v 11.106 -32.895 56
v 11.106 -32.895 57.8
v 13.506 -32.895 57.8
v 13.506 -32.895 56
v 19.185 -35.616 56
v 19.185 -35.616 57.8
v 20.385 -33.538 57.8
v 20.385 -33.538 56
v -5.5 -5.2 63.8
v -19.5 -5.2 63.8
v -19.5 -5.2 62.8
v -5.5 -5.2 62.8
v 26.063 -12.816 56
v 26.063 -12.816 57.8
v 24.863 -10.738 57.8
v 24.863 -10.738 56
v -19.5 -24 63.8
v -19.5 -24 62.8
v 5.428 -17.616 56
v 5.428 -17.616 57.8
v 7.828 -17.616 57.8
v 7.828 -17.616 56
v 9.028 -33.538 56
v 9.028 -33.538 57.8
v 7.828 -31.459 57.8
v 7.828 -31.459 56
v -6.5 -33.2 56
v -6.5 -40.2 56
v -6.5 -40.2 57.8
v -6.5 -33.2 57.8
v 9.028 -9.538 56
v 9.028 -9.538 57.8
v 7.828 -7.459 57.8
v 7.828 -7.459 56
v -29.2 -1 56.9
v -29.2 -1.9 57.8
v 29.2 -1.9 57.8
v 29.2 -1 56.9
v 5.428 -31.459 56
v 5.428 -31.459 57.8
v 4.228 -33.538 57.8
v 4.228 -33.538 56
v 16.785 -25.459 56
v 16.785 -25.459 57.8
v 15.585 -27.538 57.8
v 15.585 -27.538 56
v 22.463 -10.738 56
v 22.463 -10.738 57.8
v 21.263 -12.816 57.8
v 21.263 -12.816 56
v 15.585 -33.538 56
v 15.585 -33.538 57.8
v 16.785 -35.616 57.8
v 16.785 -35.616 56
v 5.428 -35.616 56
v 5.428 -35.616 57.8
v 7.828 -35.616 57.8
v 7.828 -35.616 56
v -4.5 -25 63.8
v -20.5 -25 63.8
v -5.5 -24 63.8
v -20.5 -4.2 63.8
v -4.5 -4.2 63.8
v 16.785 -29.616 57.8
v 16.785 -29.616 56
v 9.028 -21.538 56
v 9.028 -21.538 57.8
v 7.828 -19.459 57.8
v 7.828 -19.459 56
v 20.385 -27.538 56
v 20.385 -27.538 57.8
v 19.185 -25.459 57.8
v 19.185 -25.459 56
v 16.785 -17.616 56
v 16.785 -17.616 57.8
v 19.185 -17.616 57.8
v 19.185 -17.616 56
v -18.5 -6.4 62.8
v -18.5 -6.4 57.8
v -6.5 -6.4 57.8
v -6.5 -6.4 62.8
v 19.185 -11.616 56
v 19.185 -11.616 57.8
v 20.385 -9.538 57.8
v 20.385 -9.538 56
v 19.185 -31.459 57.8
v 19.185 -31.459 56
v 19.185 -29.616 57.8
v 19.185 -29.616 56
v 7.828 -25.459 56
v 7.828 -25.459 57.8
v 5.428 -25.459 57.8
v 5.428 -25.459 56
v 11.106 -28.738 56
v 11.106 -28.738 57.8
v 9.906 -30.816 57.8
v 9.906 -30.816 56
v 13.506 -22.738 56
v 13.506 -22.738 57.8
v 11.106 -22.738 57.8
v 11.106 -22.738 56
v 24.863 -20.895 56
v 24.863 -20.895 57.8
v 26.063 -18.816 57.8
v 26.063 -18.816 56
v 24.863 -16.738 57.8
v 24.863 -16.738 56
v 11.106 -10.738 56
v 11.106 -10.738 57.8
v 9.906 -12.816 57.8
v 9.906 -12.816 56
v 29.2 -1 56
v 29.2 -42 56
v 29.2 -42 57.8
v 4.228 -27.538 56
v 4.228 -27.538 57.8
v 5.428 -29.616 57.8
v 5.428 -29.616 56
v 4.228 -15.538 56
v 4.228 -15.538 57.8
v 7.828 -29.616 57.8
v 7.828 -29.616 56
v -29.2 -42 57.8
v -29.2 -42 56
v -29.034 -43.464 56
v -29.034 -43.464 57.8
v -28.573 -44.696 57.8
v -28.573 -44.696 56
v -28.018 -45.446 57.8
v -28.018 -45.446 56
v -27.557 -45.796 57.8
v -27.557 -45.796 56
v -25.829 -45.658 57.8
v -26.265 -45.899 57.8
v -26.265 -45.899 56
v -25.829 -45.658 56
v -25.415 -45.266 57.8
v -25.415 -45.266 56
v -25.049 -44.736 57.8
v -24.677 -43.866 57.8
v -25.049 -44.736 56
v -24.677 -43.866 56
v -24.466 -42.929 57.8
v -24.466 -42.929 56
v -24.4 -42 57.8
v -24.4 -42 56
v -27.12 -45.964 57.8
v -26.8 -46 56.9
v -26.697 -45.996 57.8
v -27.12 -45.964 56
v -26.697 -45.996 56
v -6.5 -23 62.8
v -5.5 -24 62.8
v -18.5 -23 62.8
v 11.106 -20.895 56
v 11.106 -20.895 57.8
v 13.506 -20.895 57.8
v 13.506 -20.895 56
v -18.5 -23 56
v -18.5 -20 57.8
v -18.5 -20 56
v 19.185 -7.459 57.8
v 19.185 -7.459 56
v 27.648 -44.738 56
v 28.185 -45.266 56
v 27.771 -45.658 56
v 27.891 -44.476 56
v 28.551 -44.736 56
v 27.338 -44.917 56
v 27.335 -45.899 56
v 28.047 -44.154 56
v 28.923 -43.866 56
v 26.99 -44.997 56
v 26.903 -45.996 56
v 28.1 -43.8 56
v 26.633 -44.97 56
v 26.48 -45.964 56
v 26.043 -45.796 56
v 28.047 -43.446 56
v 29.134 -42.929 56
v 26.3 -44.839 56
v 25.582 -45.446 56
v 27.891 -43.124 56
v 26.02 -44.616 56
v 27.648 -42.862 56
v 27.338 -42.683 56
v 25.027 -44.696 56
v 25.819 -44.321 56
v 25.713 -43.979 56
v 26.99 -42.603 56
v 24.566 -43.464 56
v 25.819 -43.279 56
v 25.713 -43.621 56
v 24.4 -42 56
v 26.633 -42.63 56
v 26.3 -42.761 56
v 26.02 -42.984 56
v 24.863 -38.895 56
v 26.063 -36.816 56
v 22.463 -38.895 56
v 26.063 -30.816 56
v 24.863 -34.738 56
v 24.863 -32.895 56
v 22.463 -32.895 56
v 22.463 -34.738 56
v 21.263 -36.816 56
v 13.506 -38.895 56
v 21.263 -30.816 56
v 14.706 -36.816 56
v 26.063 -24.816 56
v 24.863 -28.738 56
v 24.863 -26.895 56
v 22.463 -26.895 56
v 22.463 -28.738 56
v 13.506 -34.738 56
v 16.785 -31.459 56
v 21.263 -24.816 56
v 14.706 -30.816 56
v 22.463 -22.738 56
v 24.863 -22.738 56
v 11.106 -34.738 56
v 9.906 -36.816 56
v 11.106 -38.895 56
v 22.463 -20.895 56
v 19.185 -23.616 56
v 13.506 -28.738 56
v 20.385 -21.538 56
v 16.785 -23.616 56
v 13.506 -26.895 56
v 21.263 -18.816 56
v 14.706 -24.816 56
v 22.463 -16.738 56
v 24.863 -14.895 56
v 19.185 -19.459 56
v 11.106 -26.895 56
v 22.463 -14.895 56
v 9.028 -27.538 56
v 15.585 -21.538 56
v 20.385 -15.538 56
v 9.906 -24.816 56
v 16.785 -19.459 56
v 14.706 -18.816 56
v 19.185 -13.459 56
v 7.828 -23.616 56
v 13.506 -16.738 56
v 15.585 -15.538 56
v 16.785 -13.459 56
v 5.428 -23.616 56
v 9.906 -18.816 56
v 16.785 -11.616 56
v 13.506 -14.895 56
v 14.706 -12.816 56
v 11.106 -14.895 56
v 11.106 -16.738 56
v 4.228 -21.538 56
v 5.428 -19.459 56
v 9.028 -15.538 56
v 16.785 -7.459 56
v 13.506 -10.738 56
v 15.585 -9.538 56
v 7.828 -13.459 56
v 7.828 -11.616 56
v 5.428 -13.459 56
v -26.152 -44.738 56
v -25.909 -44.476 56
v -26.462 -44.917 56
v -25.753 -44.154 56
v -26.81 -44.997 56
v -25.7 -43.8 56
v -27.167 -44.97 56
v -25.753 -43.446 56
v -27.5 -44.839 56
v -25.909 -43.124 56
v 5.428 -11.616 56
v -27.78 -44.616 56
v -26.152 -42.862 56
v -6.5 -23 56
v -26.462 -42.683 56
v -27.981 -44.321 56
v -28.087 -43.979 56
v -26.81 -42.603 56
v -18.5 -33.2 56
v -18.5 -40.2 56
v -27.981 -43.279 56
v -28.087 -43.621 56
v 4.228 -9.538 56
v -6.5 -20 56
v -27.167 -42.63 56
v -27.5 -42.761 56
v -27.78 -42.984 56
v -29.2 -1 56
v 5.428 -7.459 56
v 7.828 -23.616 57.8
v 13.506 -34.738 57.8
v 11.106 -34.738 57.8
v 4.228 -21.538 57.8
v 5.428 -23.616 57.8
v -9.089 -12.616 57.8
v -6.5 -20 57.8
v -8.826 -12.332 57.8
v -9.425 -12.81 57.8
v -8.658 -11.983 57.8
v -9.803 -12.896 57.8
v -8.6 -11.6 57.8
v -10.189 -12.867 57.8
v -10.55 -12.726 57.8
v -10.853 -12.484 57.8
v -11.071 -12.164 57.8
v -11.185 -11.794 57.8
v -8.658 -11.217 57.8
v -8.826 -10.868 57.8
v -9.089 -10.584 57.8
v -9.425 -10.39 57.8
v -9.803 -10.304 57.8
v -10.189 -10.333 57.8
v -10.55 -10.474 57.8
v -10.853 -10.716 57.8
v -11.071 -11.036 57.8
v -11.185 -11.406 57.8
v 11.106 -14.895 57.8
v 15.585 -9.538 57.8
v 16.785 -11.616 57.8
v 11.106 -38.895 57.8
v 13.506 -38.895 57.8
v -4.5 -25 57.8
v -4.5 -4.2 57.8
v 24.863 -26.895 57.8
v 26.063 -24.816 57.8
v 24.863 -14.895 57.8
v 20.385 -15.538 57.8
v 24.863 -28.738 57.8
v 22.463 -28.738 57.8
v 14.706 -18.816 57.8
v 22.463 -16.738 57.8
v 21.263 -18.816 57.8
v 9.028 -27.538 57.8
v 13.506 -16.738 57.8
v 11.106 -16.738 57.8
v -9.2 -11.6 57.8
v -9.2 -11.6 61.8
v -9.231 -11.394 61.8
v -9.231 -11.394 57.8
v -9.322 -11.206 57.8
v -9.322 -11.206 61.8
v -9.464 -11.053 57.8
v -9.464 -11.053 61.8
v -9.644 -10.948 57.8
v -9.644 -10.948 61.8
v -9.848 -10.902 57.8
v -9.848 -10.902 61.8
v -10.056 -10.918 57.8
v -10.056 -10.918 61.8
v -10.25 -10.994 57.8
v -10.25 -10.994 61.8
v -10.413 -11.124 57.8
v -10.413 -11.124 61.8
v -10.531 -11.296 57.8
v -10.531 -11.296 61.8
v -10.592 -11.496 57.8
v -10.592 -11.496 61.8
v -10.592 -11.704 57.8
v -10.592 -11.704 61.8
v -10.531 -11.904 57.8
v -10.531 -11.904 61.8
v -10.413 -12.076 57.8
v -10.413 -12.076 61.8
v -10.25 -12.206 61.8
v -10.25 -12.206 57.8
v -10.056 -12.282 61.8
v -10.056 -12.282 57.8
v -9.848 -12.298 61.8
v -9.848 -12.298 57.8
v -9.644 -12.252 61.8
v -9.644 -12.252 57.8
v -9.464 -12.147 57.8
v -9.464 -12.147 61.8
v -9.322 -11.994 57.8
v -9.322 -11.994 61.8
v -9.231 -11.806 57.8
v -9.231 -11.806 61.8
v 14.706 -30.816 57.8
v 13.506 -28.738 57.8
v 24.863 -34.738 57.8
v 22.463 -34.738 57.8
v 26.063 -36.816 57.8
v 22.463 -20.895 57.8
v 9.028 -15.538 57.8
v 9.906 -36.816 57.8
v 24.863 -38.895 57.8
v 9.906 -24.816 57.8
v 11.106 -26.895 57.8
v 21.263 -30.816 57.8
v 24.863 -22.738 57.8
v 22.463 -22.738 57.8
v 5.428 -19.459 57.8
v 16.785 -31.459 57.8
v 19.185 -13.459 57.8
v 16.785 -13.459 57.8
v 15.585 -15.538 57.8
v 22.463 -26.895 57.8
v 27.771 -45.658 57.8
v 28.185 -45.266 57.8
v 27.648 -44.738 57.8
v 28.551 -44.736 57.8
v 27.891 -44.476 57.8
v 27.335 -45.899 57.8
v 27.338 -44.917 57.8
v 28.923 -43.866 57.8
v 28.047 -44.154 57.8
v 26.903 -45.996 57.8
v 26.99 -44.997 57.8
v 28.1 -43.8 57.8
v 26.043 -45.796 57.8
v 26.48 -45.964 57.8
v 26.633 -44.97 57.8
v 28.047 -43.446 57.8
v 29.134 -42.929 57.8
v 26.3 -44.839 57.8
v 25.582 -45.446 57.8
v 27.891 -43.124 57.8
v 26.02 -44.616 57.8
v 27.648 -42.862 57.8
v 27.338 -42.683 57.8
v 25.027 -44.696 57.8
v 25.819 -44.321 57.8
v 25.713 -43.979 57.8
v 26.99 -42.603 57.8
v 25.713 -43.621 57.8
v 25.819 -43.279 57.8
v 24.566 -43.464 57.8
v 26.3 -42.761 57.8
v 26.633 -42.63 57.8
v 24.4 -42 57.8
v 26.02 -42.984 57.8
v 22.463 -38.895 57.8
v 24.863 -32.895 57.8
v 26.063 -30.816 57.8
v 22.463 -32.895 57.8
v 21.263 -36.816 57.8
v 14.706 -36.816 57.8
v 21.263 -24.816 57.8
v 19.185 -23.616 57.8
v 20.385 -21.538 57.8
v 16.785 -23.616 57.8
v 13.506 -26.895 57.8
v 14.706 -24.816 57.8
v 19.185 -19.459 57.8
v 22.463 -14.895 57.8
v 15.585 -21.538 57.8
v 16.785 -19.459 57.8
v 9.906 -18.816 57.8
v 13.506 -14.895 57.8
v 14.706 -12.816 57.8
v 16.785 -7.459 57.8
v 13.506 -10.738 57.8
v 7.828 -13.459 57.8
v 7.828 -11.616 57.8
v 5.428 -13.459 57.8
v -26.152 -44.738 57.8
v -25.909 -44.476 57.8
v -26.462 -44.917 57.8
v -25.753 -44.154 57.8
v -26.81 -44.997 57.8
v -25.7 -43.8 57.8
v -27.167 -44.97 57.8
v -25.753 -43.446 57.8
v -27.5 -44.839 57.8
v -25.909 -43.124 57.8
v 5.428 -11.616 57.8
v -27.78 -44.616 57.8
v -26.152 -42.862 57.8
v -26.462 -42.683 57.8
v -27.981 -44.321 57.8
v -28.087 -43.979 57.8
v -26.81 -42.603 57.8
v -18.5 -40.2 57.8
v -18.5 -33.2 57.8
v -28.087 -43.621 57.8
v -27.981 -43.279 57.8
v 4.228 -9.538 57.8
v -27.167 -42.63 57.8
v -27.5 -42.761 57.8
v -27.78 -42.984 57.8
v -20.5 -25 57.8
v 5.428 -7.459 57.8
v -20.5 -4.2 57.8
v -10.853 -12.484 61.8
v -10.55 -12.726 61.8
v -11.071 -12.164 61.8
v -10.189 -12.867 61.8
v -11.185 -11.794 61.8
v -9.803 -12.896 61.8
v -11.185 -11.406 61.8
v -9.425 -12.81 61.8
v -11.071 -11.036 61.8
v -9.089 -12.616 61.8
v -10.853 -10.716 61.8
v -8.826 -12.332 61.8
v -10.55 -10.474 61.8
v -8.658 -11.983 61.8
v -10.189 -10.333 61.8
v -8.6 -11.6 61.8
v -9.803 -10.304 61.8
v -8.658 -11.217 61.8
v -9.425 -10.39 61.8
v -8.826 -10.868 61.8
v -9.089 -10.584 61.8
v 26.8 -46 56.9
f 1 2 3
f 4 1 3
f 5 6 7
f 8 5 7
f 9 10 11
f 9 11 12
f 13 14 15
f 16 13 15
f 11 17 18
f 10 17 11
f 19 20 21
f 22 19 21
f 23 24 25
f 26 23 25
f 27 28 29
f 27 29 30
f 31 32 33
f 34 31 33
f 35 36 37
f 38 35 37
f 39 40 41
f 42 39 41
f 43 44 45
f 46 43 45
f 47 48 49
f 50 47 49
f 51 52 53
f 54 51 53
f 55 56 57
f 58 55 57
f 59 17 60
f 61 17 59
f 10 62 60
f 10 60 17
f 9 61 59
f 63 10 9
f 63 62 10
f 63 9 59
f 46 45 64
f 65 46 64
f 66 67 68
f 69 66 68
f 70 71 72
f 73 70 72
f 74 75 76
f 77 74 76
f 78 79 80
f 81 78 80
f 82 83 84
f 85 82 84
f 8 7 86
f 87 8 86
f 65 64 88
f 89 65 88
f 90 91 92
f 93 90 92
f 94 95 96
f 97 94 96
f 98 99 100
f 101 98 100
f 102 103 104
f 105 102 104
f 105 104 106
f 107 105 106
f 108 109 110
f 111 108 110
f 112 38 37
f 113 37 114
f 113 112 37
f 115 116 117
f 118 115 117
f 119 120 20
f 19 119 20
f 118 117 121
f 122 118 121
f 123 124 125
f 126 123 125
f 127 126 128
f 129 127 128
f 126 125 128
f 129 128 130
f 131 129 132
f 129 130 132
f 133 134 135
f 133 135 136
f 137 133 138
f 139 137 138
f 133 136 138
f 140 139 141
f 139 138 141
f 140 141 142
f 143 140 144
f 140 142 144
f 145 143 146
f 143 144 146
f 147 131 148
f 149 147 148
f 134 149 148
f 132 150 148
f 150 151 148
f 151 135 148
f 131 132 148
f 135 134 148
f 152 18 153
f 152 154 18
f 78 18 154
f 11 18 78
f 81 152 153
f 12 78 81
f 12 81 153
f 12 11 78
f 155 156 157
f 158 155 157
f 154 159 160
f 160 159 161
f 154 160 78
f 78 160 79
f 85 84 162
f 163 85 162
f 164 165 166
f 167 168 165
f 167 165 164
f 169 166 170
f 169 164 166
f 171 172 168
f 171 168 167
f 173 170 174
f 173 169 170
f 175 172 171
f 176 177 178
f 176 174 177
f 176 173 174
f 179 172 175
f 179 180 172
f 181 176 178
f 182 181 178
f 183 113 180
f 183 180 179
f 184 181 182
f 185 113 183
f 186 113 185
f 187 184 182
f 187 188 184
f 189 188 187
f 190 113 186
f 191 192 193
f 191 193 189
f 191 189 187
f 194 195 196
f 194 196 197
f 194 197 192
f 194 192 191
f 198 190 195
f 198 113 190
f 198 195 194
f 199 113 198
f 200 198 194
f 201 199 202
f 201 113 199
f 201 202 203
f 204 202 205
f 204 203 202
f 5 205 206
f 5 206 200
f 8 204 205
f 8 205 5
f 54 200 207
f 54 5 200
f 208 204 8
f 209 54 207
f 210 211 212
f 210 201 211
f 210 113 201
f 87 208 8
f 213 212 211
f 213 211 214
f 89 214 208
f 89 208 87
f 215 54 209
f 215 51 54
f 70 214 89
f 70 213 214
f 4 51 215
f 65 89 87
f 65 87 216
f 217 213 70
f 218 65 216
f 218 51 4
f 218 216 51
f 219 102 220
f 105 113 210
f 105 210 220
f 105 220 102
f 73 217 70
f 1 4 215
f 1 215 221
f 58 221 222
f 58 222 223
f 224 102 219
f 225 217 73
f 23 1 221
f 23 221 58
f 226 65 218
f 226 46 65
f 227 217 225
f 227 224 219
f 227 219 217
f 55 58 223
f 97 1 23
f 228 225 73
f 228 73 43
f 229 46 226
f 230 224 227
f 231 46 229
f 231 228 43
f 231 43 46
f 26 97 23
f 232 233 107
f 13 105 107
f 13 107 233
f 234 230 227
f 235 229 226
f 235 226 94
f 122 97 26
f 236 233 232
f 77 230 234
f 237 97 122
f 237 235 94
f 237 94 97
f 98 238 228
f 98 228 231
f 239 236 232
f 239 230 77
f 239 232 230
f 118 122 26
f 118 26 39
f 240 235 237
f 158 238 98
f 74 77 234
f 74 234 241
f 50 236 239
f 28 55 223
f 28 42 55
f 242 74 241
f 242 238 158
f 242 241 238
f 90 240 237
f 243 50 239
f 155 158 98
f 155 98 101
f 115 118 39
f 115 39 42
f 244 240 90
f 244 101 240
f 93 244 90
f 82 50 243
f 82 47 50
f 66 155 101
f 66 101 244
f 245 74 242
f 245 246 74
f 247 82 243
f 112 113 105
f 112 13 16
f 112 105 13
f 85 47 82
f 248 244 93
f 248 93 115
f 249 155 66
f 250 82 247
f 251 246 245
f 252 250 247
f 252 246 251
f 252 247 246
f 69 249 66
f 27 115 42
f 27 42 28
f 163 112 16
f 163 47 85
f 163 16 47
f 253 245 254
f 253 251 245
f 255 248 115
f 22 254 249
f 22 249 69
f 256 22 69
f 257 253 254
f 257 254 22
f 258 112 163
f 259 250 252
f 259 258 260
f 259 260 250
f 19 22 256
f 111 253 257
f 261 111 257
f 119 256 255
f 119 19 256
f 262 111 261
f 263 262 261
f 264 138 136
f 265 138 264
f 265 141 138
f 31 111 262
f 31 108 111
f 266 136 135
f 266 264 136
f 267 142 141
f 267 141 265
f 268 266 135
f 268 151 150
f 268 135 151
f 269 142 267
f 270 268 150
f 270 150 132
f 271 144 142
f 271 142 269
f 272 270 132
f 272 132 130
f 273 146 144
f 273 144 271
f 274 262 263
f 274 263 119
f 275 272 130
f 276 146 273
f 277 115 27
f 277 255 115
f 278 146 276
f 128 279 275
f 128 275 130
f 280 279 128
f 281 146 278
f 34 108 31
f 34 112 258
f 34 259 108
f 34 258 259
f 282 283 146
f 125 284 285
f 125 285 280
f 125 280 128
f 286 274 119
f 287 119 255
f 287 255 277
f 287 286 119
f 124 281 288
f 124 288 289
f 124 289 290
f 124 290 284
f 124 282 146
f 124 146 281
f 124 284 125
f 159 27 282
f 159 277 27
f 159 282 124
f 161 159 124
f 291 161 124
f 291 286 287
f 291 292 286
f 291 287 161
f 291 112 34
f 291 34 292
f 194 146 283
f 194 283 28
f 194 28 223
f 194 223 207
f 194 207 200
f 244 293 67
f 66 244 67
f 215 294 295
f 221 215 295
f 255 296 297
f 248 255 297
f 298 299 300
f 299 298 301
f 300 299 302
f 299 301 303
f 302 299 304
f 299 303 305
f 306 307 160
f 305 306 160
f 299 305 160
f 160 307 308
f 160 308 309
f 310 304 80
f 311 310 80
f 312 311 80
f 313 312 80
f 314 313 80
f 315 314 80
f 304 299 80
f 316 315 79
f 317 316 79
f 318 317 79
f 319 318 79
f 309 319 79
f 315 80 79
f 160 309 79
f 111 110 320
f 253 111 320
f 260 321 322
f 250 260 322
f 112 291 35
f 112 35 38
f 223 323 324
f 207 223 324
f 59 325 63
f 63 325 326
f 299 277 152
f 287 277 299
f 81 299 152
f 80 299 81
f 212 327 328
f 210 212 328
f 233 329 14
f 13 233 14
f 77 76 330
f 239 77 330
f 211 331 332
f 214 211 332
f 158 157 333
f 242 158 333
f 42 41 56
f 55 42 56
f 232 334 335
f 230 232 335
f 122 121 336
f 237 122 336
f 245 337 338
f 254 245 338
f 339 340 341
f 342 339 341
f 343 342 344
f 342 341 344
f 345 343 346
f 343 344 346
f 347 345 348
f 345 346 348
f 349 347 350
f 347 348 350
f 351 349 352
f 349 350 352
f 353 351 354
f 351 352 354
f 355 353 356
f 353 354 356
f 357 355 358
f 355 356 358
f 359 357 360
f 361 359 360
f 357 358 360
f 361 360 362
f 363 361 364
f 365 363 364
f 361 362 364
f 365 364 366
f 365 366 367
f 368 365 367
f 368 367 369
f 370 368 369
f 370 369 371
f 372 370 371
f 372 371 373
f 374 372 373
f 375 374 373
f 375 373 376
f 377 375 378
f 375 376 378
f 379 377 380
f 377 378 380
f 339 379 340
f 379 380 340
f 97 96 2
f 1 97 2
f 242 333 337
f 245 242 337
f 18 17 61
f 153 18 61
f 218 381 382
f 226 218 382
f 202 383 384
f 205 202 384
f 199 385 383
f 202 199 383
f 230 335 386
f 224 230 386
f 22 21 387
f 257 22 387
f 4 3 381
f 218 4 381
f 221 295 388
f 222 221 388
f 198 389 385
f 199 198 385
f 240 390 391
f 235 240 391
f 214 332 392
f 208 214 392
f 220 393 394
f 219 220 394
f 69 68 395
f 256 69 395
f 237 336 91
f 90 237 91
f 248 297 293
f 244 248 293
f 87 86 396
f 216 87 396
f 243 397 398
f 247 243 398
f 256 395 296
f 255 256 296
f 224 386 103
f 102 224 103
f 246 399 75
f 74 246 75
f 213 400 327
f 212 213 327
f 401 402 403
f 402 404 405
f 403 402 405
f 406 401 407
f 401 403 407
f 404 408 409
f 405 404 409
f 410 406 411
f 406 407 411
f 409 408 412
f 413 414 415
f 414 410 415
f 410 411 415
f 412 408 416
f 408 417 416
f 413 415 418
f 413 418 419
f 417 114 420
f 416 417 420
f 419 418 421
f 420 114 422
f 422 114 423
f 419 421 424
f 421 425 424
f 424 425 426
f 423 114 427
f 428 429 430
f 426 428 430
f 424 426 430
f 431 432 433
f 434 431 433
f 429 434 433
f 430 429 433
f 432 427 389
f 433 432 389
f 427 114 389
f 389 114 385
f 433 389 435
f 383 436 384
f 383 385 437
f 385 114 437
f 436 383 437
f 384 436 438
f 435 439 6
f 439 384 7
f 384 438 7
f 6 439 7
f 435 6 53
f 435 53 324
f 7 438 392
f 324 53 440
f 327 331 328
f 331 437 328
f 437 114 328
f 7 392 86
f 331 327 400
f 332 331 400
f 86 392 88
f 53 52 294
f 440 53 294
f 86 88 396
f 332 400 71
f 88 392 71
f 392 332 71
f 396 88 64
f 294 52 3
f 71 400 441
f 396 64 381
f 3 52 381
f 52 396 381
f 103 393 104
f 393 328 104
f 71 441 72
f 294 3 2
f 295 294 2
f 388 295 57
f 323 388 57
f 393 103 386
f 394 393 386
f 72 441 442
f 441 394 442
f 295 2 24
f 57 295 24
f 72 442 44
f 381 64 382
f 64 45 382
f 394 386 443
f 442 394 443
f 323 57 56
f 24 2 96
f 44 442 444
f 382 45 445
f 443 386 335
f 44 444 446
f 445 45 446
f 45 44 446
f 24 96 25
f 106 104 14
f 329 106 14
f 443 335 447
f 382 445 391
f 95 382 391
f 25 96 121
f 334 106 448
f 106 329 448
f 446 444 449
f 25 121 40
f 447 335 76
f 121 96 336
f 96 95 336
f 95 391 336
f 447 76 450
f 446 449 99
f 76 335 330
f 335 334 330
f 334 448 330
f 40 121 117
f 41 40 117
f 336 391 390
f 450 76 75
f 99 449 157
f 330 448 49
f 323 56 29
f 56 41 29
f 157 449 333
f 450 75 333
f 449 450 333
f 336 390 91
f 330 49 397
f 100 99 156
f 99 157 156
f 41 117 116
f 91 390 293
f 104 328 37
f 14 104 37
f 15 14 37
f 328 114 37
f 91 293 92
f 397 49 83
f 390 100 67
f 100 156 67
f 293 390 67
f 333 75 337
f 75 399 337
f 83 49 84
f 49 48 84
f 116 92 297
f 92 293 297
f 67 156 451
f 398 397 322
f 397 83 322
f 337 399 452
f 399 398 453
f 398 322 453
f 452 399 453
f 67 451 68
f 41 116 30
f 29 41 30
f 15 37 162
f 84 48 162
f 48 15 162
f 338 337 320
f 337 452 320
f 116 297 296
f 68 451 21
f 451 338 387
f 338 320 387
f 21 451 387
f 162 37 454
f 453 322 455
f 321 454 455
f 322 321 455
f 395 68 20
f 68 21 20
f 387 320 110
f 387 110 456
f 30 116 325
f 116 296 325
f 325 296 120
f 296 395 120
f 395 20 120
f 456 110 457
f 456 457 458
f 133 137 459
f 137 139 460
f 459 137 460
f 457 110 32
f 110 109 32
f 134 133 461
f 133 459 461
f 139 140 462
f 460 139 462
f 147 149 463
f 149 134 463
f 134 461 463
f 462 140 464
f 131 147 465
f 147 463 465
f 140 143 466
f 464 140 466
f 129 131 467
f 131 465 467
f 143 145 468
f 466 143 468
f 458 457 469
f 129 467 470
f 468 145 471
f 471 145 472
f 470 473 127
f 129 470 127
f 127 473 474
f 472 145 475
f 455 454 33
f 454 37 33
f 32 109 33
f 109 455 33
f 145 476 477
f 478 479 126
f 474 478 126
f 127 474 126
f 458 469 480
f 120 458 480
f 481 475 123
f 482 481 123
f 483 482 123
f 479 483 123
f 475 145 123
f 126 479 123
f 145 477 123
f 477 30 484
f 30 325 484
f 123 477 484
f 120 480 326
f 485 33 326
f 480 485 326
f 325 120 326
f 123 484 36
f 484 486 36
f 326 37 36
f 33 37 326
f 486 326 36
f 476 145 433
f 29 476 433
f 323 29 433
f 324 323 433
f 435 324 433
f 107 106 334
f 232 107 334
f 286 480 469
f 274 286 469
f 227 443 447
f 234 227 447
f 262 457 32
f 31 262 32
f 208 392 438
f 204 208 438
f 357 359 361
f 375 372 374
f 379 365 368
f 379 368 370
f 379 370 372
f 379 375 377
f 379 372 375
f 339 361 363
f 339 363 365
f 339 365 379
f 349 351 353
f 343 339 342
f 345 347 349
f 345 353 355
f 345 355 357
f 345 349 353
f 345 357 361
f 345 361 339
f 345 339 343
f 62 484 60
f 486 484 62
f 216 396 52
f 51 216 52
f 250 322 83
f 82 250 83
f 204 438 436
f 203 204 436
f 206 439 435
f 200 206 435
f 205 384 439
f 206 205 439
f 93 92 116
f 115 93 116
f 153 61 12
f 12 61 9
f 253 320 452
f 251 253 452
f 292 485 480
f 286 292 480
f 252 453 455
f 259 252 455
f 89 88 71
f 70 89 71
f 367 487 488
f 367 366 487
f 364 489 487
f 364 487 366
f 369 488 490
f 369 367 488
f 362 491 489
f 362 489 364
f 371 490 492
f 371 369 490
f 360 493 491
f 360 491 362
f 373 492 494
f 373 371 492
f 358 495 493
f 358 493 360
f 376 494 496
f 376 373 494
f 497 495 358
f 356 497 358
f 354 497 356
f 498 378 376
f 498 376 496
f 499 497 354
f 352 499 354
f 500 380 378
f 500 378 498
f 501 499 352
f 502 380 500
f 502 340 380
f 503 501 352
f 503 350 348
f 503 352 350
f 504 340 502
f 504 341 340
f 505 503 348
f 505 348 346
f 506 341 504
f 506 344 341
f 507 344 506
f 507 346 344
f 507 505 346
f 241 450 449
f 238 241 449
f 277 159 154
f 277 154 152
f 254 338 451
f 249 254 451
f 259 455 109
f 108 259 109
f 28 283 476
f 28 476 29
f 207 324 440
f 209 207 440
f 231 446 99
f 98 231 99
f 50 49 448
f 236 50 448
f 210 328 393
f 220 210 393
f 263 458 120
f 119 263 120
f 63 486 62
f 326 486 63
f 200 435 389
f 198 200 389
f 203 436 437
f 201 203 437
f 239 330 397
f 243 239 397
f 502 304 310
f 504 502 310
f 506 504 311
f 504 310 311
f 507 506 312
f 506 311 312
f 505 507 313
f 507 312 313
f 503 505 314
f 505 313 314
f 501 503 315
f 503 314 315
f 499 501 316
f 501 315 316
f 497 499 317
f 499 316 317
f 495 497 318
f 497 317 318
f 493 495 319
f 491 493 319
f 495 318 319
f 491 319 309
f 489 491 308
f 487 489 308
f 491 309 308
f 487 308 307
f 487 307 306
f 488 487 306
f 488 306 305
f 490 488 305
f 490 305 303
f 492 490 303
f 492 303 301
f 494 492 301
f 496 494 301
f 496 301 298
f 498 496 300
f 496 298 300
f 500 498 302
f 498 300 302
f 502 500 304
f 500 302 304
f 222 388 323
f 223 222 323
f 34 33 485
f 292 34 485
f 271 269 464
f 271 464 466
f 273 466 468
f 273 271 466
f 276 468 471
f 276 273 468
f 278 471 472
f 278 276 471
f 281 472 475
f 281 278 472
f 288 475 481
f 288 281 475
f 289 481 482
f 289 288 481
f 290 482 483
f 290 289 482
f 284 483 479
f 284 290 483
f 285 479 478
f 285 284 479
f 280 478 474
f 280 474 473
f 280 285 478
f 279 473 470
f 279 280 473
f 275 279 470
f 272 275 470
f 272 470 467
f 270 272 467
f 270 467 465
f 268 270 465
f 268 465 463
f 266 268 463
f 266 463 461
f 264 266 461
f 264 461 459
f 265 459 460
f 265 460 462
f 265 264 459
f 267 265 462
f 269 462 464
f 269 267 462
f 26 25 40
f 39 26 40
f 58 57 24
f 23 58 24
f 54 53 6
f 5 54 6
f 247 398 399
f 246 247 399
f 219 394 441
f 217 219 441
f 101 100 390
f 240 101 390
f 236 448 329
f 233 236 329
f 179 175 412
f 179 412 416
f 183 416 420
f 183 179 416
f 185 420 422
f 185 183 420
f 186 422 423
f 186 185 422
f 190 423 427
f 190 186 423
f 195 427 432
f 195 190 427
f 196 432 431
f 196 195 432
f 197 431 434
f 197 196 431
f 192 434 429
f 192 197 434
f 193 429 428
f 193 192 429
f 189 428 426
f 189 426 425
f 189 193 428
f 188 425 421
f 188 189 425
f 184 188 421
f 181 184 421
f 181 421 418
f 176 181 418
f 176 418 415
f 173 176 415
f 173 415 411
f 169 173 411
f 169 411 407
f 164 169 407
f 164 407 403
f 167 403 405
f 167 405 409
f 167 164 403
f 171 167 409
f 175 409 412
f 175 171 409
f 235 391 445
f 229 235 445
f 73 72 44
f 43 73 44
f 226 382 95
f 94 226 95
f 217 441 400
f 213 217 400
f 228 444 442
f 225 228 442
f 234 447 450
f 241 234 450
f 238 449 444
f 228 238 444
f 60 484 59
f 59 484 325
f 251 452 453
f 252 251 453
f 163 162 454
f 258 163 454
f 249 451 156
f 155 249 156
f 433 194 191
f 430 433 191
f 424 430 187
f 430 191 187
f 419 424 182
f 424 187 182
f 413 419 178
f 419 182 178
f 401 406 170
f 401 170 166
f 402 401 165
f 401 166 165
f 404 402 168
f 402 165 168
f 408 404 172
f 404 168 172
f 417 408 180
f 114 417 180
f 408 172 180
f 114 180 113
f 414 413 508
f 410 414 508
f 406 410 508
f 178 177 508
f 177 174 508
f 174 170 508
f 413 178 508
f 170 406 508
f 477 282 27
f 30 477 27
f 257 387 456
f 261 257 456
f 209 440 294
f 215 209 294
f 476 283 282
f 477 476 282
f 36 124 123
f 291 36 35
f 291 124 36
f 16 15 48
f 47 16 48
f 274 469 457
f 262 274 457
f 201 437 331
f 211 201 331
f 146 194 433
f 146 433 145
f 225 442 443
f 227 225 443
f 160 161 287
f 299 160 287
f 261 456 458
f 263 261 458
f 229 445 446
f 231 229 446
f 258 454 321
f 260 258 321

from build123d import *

# Parameters (mm, degrees)
SKETCH012_R         = 1.2
SKETCH012_W         = 12
SKETCH012_H         = 7
SKETCH012_H_2       = 3
PAD006_DEPTH        = 1.8
CHAMFER002_ANGLE    = 45
CHAMFER002_SIZE     = 0.9
POCKET_DEPTH        = 1.801
LINEARPATTERN_COUNT = 5
LINEARPATTERN_PITCH = 6
SKETCH015_W         = 16
SKETCH015_H         = 20.8
SKETCH015_W_2       = 12
SKETCH015_H_2       = 16.6
PAD007_DEPTH        = 6
SKETCH016_R         = 1.3
PAD008_DEPTH        = 4
SKETCH017_R         = 0.7
POCKET007_DEPTH     = 4
SKETCH018_W         = 14
SKETCH018_H         = 18.8
POCKET008_DEPTH     = 1


with BuildPart() as part:
    # Sketch012 → Pad006 (new body)
    with BuildSketch(Plane.XY.offset(56)):
        with BuildLine():
            Line((-29.2, -1), (29.2, -1))
            Line((29.2, -1), (29.2, -42))
            add(Edge.make_bspline(
                [(24.4, -42), (24.4, -46), (26.8, -46), (29.2, -46), (29.2, -42)],
                knots=[4.712389, 4.712389, 4.712389, 6.283185, 6.283185, 7.853982, 7.853982, 7.853982], degree=2, weights=[1, 0.707107, 1, 0.707107, 1]))
            Line((24.4, -42), (-24.4, -42))
            add(Edge.make_bspline(
                [(-29.2, -42), (-29.2, -46), (-26.8, -46), (-24.4, -46), (-24.4, -42)],
                knots=[4.712389, 4.712389, 4.712389, 6.283185, 6.283185, 7.853982, 7.853982, 7.853982], degree=2, weights=[1, 0.707107, 1, 0.707107, 1]))
            Line((-29.2, -42), (-29.2, -1))
        make_face()
        with Locations((-26.9, -43.8)):
            Circle(SKETCH012_R, mode=Mode.SUBTRACT)
        with Locations((26.9, -43.8)):
            Circle(SKETCH012_R, mode=Mode.SUBTRACT)
        with Locations((-12.5, -36.7)):
            Rectangle(SKETCH012_W, SKETCH012_H, mode=Mode.SUBTRACT)
        with Locations((-12.5, -21.5)):
            Rectangle(SKETCH012_W, SKETCH012_H_2, mode=Mode.SUBTRACT)
    extrude(amount=PAD006_DEPTH)

    # Chamfer002
    chamfer002_edges = [part.edges().sort_by_distance(p)[0] for p in [
        (0, -1, 57.8),
    ]]
    chamfer002_side = part.faces().sort_by_distance((0, -1, 56.9))[0]
    chamfer(chamfer002_edges, length=CHAMFER002_SIZE, angle=CHAMFER002_ANGLE, reference=chamfer002_side)

    # Sketch013 → Pocket (cut, through all)
    with BuildSketch(Plane.XY.offset(57.8)):
        Polygon((7.827629, -35.616149), (9.027629, -33.537688), (7.827629, -31.459227), (5.427629, -31.459227), (4.227629, -33.537688), (5.427629, -35.616149), align=None)
        Polygon((19.184551, -35.616149), (20.384551, -33.537688), (19.184551, -31.459227), (16.784551, -31.459227), (15.584551, -33.537688), (16.784551, -35.616149), align=None)
        Polygon((13.50609, -38.89461), (14.70609, -36.816149), (13.50609, -34.737688), (11.10609, -34.737688), (9.90609, -36.816149), (11.10609, -38.89461), align=None)
        Polygon((24.863012, -38.89461), (26.063012, -36.816149), (24.863012, -34.737688), (22.463012, -34.737688), (21.263012, -36.816149), (22.463012, -38.89461), align=None)
    pocket = extrude(amount=-POCKET_DEPTH, mode=Mode.SUBTRACT)

    # LinearPattern: Pocket ×5
    with Locations(*[(0, i * LINEARPATTERN_PITCH, 0) for i in range(1, LINEARPATTERN_COUNT)]):
        add(pocket, mode=Mode.SUBTRACT)

    # Sketch015 (on DatumPlane) → Pad007 (join)
    with BuildSketch(Plane.XY.offset(57.8)):
        with Locations((-12.5, -14.6)):
            Rectangle(SKETCH015_W, SKETCH015_H)
        with Locations((-12.5, -14.7)):
            Rectangle(SKETCH015_W_2, SKETCH015_H_2, mode=Mode.SUBTRACT)
    extrude(amount=PAD007_DEPTH)

    # Sketch016 (on DatumPlane) → Pad008 (join)
    with BuildSketch(Plane.XY.offset(57.8)):
        with Locations((-9.9, -11.6)):
            Circle(SKETCH016_R)
    extrude(amount=PAD008_DEPTH)

    # Sketch017 (on Face156 of Pocket008) → Pocket007 (cut)
    with BuildSketch(Plane.XY.offset(61.8)):
        with Locations((-9.9, -11.6)):
            Circle(SKETCH017_R)
    extrude(amount=-POCKET007_DEPTH, mode=Mode.SUBTRACT)

    # Sketch018 (on Face148 of Pocket007) → Pocket008 (cut)
    with BuildSketch(Plane.XY.offset(63.8)):
        with Locations((-12.5, -14.6)):
            Rectangle(SKETCH018_W, SKETCH018_H)
    extrude(amount=-POCKET008_DEPTH, mode=Mode.SUBTRACT)


solid = part.part
